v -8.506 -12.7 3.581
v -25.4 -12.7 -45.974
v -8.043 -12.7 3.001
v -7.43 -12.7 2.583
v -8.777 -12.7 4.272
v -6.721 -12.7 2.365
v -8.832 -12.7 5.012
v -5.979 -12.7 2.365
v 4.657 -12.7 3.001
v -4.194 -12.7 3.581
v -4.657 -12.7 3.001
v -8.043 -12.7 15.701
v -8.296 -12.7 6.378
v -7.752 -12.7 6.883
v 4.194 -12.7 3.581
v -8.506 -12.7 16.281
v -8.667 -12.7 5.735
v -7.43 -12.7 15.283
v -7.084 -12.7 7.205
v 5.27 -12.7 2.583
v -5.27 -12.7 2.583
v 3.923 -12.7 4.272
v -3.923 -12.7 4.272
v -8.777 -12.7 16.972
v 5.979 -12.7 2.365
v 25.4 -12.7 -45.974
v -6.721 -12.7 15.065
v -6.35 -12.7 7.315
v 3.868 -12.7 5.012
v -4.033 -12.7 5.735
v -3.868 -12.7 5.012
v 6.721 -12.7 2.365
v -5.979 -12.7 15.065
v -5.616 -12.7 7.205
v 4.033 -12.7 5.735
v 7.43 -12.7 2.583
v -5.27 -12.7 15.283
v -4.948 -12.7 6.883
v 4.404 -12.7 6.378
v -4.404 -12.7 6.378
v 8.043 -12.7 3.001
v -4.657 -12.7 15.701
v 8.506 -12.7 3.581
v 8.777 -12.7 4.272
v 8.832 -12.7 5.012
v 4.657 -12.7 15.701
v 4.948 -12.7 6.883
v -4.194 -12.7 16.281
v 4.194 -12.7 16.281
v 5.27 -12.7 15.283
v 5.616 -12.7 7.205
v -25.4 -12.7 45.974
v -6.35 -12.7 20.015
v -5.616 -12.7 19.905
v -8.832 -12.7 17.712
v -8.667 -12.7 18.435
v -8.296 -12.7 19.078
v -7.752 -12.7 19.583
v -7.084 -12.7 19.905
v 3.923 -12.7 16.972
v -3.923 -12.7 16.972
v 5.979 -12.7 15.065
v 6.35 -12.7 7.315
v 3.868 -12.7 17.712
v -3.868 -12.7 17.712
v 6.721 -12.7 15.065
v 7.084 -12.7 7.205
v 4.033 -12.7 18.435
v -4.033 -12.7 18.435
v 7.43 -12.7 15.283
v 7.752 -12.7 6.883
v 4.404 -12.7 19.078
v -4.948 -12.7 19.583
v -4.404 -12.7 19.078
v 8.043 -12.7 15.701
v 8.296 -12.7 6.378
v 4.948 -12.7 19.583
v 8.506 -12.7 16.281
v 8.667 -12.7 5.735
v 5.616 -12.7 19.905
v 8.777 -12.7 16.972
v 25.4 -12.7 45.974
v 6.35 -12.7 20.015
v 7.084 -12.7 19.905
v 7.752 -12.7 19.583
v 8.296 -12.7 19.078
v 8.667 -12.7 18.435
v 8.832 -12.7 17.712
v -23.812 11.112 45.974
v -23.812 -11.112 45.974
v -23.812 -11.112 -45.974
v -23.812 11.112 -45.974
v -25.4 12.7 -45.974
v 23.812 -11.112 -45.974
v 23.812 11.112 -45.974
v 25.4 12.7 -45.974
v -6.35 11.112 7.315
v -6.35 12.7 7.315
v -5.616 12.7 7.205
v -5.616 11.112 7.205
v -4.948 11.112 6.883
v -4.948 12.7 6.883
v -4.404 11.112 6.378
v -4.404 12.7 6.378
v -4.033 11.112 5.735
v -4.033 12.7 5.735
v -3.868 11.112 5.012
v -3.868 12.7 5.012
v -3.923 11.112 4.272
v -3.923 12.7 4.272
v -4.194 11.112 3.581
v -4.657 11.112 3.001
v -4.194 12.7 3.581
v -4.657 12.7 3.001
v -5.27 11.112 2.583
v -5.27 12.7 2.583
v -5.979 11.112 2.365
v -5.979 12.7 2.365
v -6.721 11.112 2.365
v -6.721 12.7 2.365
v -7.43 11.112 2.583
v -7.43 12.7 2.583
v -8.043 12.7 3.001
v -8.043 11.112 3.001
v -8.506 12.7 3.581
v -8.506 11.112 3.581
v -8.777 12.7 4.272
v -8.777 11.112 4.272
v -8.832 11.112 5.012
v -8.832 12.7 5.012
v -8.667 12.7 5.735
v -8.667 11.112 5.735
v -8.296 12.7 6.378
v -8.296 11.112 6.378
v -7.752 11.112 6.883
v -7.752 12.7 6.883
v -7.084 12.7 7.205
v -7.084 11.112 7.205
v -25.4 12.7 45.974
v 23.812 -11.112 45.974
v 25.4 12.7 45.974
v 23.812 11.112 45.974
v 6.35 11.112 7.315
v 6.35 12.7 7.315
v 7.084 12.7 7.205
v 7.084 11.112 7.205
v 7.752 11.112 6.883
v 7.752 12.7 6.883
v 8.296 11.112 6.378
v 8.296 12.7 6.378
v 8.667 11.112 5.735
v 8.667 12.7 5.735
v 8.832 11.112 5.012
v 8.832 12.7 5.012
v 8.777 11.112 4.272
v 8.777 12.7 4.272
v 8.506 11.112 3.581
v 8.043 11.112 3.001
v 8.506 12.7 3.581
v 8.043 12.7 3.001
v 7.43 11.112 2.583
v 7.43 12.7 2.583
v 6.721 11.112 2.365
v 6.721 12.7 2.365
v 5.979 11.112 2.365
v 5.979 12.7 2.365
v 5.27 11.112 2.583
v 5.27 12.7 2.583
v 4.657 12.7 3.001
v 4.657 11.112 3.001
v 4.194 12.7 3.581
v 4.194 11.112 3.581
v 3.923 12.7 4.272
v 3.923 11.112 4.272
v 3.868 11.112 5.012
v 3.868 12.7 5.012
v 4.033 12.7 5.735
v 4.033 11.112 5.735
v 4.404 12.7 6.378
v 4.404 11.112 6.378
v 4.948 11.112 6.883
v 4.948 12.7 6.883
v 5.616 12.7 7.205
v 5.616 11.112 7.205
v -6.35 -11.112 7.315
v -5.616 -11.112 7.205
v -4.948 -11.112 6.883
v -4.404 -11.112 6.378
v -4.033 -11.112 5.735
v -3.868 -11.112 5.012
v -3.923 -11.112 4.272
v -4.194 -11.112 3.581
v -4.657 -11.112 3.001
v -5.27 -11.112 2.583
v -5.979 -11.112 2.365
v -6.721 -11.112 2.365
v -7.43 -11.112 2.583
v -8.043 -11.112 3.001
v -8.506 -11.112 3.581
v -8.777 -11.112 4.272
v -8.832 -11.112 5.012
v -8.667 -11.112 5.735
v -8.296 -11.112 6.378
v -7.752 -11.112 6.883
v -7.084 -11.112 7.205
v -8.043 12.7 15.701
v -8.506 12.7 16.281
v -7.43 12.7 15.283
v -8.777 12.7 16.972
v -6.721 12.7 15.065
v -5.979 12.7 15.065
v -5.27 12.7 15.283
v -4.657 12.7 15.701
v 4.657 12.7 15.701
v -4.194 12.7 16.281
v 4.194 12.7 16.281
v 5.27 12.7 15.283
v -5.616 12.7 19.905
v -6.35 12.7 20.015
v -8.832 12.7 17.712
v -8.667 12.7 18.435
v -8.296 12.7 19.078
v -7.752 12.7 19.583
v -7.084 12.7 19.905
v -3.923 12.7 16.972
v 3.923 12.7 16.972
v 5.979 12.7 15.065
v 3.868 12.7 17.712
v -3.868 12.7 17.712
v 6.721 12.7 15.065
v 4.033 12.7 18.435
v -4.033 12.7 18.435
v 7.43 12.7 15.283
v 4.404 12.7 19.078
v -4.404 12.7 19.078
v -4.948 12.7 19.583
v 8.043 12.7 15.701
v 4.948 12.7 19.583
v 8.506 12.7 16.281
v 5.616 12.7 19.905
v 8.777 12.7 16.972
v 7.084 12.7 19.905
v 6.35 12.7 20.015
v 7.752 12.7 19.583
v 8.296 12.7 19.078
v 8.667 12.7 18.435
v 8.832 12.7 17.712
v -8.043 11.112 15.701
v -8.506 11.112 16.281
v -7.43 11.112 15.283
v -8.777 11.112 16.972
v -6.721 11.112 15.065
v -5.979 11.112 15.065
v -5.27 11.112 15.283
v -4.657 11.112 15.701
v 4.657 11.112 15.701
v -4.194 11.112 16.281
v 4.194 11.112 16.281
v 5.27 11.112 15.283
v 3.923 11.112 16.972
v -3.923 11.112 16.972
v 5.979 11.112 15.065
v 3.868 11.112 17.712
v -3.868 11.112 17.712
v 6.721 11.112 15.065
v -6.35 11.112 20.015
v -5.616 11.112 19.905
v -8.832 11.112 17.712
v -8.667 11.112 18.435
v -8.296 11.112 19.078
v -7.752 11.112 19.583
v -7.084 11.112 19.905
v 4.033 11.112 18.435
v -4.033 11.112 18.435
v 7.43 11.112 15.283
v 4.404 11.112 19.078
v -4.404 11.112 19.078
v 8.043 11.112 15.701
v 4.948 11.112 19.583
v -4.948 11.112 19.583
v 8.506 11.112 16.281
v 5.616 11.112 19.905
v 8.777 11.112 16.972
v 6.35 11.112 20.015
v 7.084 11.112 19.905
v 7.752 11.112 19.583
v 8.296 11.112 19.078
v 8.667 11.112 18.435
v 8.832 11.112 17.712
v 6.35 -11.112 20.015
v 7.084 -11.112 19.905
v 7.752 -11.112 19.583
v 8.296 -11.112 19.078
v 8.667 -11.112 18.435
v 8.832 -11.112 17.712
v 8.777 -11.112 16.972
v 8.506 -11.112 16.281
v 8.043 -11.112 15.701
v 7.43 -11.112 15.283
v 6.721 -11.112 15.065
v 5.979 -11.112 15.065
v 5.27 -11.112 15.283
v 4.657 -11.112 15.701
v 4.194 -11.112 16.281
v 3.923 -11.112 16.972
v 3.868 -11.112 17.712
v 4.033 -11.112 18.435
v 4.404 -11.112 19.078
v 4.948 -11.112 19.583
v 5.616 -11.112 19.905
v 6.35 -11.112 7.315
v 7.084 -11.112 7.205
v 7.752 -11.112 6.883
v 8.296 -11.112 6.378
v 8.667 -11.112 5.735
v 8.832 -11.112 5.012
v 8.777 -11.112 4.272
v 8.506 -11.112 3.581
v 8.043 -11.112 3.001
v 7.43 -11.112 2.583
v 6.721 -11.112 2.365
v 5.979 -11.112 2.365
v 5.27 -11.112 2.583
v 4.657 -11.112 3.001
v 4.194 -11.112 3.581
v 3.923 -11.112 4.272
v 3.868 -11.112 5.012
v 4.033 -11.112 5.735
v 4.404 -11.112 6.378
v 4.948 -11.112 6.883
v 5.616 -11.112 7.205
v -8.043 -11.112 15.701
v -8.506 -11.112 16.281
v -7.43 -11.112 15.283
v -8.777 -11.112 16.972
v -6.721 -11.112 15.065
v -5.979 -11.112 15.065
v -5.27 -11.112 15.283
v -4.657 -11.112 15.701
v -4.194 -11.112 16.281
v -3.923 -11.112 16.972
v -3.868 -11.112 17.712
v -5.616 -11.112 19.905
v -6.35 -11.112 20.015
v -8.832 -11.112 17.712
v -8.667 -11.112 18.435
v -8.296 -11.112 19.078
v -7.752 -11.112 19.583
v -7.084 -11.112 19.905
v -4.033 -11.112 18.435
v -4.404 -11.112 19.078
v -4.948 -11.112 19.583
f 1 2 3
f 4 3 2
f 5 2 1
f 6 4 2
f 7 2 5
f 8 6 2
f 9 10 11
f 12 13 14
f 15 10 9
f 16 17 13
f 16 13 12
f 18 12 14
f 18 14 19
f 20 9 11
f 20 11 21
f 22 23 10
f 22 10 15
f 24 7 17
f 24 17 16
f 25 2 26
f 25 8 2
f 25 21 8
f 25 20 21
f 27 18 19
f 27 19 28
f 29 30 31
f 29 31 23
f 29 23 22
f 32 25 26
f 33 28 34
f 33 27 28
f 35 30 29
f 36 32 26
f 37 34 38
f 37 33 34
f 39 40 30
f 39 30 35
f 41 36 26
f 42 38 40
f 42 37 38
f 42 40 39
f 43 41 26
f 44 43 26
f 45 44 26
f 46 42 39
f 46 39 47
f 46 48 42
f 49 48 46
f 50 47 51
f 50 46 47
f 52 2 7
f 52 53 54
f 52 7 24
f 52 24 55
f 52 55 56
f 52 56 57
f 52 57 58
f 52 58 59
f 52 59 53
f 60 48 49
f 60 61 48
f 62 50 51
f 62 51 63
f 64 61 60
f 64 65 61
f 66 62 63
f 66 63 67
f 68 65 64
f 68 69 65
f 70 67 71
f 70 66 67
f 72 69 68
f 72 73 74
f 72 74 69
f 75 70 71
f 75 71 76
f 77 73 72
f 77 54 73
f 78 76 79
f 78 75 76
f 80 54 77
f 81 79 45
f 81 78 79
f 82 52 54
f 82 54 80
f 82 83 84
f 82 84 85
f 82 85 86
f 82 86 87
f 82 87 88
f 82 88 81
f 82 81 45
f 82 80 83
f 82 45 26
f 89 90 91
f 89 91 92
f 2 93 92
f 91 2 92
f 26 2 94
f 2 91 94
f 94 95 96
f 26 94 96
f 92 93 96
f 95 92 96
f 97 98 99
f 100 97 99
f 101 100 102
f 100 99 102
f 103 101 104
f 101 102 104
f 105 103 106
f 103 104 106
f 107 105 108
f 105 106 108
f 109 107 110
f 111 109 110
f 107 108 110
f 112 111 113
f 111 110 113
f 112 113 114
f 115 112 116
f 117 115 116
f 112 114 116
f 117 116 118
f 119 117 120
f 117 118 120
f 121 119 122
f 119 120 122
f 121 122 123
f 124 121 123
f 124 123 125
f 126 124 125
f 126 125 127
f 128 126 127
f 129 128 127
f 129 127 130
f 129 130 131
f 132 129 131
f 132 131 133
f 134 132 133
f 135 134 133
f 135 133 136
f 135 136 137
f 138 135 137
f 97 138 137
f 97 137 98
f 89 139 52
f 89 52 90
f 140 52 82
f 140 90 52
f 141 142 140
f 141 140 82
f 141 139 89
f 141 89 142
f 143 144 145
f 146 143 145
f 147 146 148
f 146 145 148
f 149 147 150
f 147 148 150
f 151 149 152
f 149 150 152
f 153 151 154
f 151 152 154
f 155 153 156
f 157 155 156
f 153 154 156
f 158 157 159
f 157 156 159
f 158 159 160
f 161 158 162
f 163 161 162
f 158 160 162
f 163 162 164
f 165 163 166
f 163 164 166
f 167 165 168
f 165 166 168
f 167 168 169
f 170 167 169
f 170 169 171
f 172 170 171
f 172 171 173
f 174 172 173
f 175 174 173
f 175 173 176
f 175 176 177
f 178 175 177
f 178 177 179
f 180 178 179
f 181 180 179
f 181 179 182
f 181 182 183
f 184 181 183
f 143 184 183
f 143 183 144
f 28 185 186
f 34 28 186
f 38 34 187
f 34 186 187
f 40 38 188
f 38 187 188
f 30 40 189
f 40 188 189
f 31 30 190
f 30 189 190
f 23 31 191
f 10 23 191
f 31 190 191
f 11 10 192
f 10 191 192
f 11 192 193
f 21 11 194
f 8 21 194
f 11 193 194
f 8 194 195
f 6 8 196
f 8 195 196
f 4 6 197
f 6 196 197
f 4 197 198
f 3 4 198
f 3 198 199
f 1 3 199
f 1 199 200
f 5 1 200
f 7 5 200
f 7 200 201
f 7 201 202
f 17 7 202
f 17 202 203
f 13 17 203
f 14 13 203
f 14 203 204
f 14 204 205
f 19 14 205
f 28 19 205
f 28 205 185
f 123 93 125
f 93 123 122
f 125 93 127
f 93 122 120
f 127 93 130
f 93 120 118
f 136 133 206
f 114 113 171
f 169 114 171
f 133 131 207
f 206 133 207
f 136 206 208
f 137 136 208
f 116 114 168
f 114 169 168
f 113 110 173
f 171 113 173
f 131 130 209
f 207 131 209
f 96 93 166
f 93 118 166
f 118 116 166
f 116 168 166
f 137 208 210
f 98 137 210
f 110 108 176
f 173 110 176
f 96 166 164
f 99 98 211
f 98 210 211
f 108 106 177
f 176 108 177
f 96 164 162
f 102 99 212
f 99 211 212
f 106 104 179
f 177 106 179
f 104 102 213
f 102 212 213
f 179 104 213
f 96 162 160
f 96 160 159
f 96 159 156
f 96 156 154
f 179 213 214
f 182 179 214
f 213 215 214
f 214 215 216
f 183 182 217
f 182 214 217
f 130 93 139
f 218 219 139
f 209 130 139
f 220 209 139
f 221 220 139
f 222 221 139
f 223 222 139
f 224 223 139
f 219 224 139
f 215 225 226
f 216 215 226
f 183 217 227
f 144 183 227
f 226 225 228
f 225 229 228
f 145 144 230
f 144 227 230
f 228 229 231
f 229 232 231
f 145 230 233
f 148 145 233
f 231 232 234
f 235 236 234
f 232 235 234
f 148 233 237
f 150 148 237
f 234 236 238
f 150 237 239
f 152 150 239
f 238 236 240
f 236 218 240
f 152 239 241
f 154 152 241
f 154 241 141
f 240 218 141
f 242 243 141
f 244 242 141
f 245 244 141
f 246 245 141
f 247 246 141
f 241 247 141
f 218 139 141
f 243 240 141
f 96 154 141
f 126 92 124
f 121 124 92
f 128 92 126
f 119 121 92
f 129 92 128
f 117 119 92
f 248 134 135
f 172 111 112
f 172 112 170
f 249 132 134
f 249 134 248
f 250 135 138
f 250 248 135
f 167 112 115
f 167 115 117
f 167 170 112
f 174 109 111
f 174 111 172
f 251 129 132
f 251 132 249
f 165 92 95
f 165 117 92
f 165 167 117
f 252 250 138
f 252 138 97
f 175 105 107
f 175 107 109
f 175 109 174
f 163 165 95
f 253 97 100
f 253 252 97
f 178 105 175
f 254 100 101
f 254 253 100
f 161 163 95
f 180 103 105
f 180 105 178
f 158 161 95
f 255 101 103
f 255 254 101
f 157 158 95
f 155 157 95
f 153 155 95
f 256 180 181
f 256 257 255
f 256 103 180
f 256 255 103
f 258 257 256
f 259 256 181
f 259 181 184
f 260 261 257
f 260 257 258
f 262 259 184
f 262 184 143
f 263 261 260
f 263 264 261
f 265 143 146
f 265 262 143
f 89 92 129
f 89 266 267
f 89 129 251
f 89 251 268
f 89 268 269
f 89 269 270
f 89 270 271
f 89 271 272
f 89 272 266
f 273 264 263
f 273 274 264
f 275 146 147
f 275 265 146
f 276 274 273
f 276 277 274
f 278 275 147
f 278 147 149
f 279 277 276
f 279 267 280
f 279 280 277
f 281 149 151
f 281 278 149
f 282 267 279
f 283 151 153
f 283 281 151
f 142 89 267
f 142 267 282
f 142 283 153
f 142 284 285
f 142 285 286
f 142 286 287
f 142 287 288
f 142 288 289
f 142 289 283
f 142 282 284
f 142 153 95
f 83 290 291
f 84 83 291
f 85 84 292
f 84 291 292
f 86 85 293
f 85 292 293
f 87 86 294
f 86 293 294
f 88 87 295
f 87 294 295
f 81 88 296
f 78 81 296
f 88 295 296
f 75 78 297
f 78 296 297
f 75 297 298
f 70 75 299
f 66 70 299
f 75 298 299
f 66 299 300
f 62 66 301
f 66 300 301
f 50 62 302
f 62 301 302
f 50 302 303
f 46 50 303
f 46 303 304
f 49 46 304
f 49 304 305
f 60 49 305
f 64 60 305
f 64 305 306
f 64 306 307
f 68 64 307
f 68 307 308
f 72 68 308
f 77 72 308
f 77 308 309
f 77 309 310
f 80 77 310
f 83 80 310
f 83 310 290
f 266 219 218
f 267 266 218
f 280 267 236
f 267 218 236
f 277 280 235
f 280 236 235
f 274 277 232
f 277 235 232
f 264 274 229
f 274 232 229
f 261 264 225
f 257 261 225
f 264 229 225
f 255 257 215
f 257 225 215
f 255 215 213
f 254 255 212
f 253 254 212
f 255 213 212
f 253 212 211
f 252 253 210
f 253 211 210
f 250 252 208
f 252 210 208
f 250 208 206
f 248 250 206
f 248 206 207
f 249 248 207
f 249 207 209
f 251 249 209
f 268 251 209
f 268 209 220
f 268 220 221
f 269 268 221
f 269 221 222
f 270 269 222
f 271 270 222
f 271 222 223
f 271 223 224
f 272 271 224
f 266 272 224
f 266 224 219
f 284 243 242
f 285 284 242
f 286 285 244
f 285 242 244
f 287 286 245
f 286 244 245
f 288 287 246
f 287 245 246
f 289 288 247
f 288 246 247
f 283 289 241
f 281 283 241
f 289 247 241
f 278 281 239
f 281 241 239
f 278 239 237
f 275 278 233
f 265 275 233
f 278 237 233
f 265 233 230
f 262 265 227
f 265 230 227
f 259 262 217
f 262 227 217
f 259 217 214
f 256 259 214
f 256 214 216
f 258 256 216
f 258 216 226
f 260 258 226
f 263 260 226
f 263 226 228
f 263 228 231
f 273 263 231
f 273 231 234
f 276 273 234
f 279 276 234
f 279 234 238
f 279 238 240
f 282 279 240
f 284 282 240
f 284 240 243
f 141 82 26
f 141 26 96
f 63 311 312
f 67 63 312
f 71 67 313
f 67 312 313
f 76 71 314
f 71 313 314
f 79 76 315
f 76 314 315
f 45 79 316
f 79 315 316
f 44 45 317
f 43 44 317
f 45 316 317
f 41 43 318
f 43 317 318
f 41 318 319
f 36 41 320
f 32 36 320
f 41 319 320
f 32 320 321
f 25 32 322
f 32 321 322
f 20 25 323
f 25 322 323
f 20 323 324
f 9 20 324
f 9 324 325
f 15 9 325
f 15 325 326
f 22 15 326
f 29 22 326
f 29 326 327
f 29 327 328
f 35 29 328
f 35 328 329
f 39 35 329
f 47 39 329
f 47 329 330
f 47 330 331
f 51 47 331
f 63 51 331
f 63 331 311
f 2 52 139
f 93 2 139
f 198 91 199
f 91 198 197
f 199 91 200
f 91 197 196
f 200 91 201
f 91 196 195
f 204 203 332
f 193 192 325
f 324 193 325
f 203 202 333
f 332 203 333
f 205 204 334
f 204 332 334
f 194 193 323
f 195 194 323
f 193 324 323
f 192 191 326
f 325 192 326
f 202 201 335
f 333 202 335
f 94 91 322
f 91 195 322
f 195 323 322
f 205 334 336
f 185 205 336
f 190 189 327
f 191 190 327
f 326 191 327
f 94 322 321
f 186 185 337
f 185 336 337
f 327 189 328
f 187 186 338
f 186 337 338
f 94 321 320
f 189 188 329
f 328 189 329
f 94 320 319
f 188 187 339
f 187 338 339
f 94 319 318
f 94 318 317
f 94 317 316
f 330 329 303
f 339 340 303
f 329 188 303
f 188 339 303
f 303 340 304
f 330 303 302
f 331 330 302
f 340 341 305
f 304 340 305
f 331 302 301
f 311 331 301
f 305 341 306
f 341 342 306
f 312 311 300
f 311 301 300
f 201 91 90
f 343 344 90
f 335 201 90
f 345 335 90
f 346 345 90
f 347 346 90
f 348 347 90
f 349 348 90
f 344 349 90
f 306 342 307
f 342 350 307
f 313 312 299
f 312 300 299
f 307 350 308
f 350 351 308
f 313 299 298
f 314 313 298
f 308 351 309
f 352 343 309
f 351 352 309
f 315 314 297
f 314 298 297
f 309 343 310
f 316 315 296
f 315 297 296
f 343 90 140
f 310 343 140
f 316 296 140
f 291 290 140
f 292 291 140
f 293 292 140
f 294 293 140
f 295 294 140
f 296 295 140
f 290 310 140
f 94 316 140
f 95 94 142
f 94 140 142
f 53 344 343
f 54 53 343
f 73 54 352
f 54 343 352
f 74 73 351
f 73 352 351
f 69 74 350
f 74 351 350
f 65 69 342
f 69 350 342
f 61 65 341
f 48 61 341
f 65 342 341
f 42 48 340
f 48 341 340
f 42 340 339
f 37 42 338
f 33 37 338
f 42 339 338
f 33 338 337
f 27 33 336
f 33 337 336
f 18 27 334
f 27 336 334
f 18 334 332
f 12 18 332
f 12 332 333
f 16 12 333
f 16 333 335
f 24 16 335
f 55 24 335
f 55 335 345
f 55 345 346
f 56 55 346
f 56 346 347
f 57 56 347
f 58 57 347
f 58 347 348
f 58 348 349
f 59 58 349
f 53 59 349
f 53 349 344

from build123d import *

# Parameters (mm, degrees)
SKETCH1_W           = 50.8
SKETCH1_H           = 25.4
SKETCH1_W_2         = 47.625
SKETCH1_H_2         = 22.225
BOSS_EXTRUDE1_DEPTH = 45.974
SKETCH2_R           = 2.4892
CUT_EXTRUDE1_DEPTH  = 59.343197341


with BuildPart() as part:
    # Sketch1 → Boss-Extrude1 (new, symmetric)
    with BuildSketch(Plane.XY):
        Rectangle(SKETCH1_W, SKETCH1_H)
        Rectangle(SKETCH1_W_2, SKETCH1_H_2, mode=Mode.SUBTRACT)
    extrude(amount=BOSS_EXTRUDE1_DEPTH, both=True)

    # Sketch2 → Cut-Extrude1 (cut, through all)
    with BuildSketch(Plane(origin=(0, 12.7, 0), x_dir=(1, 0, 0), z_dir=(0, 1, 0))):
        with Locations(Location((-6.35, -4.826, 0), (0, 0, 270))):
            Circle(SKETCH2_R)
        with Locations(Location((6.35, -4.826, 0), (0, 0, 270))):
            Circle(SKETCH2_R)
        with Locations(Location((-6.35, -17.526, 0), (0, 0, 270))):
            Circle(SKETCH2_R)
        with Locations(Location((6.35, -17.526, 0), (0, 0, 270))):
            Circle(SKETCH2_R)
    extrude(amount=-CUT_EXTRUDE1_DEPTH, mode=Mode.SUBTRACT)


solid = part.part
